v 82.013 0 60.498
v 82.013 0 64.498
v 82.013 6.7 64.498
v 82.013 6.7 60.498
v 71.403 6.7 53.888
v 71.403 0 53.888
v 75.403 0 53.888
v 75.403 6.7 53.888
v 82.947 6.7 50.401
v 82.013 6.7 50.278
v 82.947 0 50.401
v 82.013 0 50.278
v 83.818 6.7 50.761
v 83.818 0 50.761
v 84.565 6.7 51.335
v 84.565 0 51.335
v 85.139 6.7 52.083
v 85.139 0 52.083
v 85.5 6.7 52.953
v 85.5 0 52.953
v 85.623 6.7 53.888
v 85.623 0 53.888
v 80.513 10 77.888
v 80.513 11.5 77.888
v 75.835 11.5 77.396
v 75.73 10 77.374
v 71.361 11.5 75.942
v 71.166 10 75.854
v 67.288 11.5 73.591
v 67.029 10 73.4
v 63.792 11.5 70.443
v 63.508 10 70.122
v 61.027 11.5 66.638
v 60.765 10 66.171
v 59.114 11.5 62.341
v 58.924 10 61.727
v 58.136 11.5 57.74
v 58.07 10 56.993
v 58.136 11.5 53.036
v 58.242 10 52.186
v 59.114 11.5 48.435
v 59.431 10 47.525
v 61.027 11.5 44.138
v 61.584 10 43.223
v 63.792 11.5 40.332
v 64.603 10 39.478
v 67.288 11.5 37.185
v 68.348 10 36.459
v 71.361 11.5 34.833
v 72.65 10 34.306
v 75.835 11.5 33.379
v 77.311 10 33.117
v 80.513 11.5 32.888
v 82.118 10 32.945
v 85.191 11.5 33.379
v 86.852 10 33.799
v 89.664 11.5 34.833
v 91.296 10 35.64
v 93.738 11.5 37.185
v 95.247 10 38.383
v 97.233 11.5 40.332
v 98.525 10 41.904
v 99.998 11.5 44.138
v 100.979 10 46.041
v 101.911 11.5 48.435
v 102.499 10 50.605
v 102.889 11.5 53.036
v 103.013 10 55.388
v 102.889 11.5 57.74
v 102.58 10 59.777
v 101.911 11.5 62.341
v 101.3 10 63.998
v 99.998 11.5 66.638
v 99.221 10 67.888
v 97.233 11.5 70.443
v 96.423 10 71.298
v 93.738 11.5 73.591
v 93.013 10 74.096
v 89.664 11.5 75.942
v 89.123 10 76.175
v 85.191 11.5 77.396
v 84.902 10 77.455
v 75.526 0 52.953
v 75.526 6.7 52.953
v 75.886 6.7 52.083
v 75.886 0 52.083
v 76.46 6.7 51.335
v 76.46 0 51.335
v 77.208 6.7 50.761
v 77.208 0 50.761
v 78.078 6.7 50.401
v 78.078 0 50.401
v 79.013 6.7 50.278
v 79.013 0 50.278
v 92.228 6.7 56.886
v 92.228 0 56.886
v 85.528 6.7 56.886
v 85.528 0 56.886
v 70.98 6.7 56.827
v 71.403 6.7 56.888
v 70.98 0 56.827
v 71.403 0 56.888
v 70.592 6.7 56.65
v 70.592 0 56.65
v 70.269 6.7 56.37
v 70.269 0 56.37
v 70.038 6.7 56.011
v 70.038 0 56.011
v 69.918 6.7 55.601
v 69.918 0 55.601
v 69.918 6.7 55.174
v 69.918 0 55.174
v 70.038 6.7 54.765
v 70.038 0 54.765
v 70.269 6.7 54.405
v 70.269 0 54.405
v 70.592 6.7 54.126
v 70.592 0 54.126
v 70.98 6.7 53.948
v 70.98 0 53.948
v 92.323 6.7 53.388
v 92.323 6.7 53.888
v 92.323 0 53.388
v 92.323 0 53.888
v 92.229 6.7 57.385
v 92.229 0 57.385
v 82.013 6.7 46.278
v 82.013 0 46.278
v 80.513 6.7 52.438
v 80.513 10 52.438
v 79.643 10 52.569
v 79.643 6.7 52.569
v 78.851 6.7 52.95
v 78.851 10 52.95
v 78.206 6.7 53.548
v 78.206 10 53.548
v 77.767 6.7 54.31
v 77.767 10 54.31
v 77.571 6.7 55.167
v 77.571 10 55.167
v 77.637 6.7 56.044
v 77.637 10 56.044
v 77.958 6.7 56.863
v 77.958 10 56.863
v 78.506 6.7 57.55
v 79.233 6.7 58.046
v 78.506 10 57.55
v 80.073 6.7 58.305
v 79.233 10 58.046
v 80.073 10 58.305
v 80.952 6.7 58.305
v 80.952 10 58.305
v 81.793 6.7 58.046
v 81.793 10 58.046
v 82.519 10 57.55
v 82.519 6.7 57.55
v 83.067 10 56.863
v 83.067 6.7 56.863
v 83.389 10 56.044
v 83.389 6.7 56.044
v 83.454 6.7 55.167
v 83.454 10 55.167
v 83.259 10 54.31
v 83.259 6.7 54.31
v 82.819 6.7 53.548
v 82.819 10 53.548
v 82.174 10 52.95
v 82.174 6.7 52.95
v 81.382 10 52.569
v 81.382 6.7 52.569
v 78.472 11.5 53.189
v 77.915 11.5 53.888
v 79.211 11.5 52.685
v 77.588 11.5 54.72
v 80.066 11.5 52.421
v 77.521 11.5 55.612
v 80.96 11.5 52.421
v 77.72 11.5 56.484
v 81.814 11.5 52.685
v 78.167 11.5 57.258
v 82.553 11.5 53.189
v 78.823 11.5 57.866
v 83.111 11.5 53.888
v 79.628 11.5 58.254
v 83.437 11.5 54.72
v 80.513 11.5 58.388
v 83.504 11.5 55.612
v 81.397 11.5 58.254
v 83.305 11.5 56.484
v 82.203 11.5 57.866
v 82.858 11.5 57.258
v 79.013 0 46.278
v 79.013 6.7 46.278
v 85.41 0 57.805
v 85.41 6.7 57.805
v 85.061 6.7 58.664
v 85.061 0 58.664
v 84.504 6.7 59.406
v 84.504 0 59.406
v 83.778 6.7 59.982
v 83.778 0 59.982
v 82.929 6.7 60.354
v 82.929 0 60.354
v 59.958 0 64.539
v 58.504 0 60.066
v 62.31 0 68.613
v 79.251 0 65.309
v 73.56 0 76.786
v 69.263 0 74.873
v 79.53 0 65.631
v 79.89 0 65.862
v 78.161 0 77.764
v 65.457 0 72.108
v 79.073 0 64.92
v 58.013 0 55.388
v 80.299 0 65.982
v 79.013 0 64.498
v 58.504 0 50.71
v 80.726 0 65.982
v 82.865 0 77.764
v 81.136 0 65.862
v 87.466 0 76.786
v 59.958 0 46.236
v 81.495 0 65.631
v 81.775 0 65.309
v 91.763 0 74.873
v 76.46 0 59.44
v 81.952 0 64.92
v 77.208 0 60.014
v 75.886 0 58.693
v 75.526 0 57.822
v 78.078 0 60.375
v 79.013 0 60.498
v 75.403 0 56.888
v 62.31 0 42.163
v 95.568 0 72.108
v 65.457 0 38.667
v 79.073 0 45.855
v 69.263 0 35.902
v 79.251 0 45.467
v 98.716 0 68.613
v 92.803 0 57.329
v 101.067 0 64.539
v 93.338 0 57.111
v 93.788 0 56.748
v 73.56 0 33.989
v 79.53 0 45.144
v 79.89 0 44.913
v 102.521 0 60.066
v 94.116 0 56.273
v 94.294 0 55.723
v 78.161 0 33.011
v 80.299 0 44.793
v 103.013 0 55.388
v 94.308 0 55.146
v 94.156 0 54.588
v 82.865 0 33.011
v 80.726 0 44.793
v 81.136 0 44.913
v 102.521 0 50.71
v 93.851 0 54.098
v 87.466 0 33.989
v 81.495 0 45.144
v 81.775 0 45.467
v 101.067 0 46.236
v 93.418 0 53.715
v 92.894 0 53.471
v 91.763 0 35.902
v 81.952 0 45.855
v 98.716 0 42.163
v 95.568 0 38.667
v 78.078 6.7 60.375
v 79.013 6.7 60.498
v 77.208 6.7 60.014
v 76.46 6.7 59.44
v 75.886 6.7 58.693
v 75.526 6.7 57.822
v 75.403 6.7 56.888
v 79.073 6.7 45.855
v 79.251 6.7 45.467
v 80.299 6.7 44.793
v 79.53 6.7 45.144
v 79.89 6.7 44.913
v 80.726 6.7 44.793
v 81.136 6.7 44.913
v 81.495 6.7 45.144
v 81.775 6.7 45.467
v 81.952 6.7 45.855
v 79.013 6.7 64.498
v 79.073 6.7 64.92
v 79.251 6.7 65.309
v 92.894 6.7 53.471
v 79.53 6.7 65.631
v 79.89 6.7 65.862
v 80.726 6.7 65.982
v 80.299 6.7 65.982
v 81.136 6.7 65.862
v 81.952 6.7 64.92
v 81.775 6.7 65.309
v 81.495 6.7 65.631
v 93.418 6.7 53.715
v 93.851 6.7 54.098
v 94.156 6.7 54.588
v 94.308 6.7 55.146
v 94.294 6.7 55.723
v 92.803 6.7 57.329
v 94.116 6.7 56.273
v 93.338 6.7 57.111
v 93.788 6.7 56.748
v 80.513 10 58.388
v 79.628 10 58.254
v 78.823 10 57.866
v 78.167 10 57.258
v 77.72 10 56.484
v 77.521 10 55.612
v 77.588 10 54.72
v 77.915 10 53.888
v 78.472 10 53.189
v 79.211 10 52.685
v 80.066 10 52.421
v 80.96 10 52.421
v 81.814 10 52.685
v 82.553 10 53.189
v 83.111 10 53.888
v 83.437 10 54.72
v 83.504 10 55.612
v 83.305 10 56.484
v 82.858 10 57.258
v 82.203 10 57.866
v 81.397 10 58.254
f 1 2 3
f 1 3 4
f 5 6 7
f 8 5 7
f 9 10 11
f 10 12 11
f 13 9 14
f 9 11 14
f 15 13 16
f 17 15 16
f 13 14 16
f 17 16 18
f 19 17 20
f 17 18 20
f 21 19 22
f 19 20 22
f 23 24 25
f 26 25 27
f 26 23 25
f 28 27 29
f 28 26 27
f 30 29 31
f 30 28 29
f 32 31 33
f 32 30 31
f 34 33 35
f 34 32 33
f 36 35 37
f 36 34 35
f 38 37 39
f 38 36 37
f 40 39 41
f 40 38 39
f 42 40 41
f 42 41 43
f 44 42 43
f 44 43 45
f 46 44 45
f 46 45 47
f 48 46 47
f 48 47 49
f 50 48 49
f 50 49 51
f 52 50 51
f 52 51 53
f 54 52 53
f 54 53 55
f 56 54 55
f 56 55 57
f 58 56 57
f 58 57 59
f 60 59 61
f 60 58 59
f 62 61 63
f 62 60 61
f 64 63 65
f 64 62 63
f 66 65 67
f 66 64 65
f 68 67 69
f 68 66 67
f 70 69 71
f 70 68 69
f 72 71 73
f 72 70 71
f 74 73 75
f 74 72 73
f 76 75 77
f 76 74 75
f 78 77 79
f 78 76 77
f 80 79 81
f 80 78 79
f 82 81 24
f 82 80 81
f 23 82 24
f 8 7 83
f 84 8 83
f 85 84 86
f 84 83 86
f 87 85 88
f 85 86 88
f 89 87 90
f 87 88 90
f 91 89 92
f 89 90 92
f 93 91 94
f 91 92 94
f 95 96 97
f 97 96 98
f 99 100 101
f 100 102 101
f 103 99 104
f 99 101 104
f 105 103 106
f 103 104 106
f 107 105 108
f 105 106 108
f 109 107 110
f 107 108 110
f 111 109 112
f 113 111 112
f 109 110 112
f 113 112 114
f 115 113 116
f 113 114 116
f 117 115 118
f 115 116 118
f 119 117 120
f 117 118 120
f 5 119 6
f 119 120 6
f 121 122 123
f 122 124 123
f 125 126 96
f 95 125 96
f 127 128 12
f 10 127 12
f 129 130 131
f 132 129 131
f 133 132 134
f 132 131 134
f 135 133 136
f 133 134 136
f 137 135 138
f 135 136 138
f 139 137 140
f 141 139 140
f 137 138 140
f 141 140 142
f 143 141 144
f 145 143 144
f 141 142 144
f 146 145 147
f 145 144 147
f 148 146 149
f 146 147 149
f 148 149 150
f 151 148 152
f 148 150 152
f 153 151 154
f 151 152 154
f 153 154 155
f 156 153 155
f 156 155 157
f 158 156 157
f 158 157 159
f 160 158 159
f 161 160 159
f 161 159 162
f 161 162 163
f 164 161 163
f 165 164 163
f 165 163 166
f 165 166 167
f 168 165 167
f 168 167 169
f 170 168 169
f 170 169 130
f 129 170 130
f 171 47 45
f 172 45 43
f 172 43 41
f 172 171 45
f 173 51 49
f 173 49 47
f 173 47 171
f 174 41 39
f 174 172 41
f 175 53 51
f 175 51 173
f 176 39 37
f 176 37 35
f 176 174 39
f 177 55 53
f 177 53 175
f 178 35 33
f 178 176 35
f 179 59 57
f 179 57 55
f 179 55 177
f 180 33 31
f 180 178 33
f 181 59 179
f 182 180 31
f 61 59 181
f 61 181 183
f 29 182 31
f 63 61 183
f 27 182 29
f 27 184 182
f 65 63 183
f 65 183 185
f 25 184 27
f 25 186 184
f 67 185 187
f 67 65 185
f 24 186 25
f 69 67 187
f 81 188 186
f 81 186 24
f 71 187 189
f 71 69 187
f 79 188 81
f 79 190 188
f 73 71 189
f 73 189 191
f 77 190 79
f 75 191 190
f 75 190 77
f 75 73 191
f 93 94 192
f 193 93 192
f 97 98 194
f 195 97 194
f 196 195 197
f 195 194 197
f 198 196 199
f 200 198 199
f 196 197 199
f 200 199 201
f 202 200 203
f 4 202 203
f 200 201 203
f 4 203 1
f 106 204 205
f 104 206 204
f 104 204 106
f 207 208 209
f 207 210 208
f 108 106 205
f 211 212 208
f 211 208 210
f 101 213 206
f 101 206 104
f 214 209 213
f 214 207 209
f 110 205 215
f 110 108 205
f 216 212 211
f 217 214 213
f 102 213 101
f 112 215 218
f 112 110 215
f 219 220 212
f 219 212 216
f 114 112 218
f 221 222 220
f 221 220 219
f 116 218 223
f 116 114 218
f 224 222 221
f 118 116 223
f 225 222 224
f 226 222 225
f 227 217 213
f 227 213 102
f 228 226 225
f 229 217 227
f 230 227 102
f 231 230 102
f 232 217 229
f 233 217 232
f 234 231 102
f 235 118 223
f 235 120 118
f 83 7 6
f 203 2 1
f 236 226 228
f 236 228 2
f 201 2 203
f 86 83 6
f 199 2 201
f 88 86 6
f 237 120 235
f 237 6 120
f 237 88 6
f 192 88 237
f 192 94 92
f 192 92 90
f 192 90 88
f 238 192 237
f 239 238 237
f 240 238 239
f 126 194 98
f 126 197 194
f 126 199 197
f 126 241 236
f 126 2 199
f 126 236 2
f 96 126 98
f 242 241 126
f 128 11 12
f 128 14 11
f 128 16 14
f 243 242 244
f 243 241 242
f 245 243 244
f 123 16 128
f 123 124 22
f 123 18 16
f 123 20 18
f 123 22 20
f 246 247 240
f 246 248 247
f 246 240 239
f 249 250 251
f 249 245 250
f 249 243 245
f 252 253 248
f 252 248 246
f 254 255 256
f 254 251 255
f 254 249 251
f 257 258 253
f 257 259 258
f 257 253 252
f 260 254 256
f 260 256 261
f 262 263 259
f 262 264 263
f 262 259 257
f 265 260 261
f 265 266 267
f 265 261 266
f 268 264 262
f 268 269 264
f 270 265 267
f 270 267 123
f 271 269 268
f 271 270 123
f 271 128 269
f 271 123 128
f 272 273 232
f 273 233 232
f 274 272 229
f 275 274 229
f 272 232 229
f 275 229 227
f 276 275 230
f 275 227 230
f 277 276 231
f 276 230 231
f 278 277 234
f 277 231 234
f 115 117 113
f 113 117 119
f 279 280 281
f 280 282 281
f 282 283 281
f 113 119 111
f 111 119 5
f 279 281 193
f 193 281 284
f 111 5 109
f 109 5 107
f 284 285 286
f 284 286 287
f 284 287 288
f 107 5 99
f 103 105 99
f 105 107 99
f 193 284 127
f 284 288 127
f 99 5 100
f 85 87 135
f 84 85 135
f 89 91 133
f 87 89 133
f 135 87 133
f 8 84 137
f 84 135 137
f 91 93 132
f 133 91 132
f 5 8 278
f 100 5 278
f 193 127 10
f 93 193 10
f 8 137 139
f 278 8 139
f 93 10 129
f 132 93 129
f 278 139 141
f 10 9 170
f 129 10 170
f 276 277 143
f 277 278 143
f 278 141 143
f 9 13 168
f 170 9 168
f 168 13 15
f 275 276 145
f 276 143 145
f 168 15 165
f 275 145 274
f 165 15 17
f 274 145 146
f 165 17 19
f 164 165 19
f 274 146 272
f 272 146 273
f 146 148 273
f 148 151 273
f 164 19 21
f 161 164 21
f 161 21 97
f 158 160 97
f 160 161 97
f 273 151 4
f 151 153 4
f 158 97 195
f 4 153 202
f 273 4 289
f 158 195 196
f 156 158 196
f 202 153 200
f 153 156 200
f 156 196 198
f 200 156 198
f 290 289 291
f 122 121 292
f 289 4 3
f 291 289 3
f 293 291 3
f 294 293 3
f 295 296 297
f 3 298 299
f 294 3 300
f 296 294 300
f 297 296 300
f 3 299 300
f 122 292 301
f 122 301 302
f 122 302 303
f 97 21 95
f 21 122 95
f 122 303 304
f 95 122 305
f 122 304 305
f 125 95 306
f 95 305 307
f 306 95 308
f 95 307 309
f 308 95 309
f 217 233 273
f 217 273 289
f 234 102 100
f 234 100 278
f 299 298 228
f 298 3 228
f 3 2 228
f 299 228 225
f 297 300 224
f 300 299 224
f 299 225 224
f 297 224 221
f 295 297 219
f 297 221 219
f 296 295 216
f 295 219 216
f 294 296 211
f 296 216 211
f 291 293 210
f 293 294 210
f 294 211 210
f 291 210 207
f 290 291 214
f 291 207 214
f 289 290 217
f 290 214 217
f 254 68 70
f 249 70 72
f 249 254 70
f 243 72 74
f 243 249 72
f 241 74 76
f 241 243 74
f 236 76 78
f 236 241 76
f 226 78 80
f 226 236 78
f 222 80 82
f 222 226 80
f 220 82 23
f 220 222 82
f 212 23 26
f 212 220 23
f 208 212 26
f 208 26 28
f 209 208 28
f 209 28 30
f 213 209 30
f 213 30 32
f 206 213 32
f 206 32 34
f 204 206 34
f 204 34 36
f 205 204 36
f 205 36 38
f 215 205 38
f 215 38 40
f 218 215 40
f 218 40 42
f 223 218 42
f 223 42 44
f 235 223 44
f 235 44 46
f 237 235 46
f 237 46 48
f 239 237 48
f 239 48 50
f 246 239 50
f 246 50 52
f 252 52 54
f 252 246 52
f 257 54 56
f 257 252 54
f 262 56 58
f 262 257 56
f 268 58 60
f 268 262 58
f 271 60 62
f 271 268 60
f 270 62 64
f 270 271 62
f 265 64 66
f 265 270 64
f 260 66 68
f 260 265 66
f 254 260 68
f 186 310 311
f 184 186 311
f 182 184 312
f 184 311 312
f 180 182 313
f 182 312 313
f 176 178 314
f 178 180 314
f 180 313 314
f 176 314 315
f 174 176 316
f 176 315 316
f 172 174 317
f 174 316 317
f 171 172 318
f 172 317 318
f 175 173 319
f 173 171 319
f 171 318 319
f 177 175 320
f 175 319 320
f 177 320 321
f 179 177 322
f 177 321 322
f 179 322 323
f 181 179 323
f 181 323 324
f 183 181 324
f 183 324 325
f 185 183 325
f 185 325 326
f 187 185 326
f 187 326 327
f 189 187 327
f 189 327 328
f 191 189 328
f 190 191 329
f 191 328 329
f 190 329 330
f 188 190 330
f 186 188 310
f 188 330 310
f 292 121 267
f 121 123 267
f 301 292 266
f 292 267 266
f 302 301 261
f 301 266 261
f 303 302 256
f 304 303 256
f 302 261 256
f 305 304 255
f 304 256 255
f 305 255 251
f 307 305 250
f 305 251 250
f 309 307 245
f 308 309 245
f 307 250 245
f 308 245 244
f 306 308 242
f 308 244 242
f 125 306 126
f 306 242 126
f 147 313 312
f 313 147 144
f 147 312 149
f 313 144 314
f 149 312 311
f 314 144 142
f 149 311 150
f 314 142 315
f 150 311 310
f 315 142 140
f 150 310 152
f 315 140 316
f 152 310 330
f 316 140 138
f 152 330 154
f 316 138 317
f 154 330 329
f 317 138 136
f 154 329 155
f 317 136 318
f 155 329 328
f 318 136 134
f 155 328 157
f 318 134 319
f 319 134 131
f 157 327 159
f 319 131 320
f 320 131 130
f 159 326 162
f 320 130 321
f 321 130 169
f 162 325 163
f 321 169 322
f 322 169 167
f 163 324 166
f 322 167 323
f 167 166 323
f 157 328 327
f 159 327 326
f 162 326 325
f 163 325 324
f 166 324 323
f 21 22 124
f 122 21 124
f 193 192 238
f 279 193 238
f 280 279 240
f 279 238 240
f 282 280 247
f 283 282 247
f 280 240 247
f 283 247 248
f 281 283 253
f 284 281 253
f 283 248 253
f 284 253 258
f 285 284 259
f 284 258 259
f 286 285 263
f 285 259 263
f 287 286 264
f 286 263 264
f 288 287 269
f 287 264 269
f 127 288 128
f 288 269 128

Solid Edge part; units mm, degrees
sketch "Sketch1" plane through (0, 0, 0) normal (0, -1, 0) x (1, 0, 0)
  circle A0 centre (80.5127, 55.3877) radius 22.5
  dimension "D1" = 45
extrude "Protrusion1" add sketch "Sketch1" against normal blind 10
sketch "Sketch2" plane through (80.5127, 10, 55.3877) normal (0, 1, 0) x (0, 0, -1)
  circle A0 centre (0, 0) radius 2.95
  dimension "D1" = 5.9
extrude "ExtrudedCutout_5" cut sketch "Sketch2" against normal blind 4
sketch "Sketch3" plane through (80.5127, 6, 55.3877) normal (0, 1, 0) x (-1, 0, 0)
  circle A0 centre (0, 0) radius 1.05
  dimension "D1" = 2.1
extrude "Cutout1" cut sketch "Sketch3" against normal up to next
sketch "Sketch4" plane through (80.5127, 5, 51.1598) normal (0, -1, 0) x (1, 0, 0)
  circle A0 centre (0, 4.2279) radius 3.55
extrude "ExtrudedCutout_7" cut sketch "Sketch4" against normal blind 0.5
chamfer "Chamfer_2" distance 1.9 distance2 0.5 1 edges at (80.5127, 6, 58.3377) measured on face at (78.605, 6, 53.362)
sketch "Sketch5" plane through (80.5127, 10, 55.3877) normal (0, 1, 0) x (0, 0, 1)
  circle A0 centre (0, 0) radius 22.5
  circle A1 centre (0, 0) radius 3
  dimension "D1" = 45
extrude "ExtrudedProtrusion_4" add sketch "Sketch5" along normal blind 1.5
sketch "Sketch6" plane through (80.5127, 0, 55.3877) normal (0, -1, 0) x (0, 0, 1)
  line L0 (1.5, 9.11) -> (1.5, 5.11)
  arc A0 (5.11, 1.5) -> (1.5, 5.11) centre (1.5, 1.5) ccw
  line L1 (5.11, 1.5) -> (9.11, 1.5)
  arc A1 (9.11, 1.5) -> (9.11, -1.5) centre (9.11, 0) cw
  line L2 (9.11, -1.5) -> (5.11, -1.5)
  arc A2 (1.4978, -5.0158) -> (5.11, -1.5) centre (1.4978, -1.4022) ccw
  line L3 (1.4978, -11.7158) -> (1.4978, -5.0158)
  line L4 (1.9978, -11.7158) -> (1.4978, -11.7158)
  arc A3 (-2, -11.81) -> (1.9978, -11.7158) centre (0, -11.81) ccw
  line L5 (-1.5, -11.81) -> (-2, -11.81)
  line L6 (-1.5, -5.11) -> (-1.5, -11.81)
  arc A4 (-5.11, -1.5) -> (-1.5, -5.11) centre (-1.5, -1.5) ccw
  line L7 (-9.11, -1.5) -> (-5.11, -1.5)
  arc A5 (-9.11, 1.5) -> (-9.11, -1.5) centre (-9.11, 0) ccw
  line L8 (-5.11, 1.5) -> (-9.11, 1.5)
  arc A6 (-5.11, 1.5) -> (-1.5, 5.11) centre (-1.5, 1.5) cw
  line L9 (-1.5, 9.11) -> (-1.5, 5.11)
  arc A7 (1.5, 9.11) -> (-1.5, 9.11) centre (0, 9.11) ccw
  dimension "D1" = 4
  dimension "D2" = 5.11
  dimension "D3" = 1.5
  dimension "D4" = 1.5
  dimension "D5" = 4
  dimension "D6" = 4
  dimension "D7" = 1.5
  dimension "D8" = 4
  dimension "D9" = 4
  dimension "D10" = 1.5
  dimension "D11" = 5.11
  dimension "D12" = 5.11
  dimension "D13" = 6.7
  dimension "D14" = 5.11
  dimension "D15" = 1.5
  dimension "D16" = 2
  dimension "D17" = 0.5
  dimension "D18" = 6.7
  dimension "D19" = 4
extrude "ExtrudedCutout_9" cut sketch "Sketch6" against normal blind 6.7
